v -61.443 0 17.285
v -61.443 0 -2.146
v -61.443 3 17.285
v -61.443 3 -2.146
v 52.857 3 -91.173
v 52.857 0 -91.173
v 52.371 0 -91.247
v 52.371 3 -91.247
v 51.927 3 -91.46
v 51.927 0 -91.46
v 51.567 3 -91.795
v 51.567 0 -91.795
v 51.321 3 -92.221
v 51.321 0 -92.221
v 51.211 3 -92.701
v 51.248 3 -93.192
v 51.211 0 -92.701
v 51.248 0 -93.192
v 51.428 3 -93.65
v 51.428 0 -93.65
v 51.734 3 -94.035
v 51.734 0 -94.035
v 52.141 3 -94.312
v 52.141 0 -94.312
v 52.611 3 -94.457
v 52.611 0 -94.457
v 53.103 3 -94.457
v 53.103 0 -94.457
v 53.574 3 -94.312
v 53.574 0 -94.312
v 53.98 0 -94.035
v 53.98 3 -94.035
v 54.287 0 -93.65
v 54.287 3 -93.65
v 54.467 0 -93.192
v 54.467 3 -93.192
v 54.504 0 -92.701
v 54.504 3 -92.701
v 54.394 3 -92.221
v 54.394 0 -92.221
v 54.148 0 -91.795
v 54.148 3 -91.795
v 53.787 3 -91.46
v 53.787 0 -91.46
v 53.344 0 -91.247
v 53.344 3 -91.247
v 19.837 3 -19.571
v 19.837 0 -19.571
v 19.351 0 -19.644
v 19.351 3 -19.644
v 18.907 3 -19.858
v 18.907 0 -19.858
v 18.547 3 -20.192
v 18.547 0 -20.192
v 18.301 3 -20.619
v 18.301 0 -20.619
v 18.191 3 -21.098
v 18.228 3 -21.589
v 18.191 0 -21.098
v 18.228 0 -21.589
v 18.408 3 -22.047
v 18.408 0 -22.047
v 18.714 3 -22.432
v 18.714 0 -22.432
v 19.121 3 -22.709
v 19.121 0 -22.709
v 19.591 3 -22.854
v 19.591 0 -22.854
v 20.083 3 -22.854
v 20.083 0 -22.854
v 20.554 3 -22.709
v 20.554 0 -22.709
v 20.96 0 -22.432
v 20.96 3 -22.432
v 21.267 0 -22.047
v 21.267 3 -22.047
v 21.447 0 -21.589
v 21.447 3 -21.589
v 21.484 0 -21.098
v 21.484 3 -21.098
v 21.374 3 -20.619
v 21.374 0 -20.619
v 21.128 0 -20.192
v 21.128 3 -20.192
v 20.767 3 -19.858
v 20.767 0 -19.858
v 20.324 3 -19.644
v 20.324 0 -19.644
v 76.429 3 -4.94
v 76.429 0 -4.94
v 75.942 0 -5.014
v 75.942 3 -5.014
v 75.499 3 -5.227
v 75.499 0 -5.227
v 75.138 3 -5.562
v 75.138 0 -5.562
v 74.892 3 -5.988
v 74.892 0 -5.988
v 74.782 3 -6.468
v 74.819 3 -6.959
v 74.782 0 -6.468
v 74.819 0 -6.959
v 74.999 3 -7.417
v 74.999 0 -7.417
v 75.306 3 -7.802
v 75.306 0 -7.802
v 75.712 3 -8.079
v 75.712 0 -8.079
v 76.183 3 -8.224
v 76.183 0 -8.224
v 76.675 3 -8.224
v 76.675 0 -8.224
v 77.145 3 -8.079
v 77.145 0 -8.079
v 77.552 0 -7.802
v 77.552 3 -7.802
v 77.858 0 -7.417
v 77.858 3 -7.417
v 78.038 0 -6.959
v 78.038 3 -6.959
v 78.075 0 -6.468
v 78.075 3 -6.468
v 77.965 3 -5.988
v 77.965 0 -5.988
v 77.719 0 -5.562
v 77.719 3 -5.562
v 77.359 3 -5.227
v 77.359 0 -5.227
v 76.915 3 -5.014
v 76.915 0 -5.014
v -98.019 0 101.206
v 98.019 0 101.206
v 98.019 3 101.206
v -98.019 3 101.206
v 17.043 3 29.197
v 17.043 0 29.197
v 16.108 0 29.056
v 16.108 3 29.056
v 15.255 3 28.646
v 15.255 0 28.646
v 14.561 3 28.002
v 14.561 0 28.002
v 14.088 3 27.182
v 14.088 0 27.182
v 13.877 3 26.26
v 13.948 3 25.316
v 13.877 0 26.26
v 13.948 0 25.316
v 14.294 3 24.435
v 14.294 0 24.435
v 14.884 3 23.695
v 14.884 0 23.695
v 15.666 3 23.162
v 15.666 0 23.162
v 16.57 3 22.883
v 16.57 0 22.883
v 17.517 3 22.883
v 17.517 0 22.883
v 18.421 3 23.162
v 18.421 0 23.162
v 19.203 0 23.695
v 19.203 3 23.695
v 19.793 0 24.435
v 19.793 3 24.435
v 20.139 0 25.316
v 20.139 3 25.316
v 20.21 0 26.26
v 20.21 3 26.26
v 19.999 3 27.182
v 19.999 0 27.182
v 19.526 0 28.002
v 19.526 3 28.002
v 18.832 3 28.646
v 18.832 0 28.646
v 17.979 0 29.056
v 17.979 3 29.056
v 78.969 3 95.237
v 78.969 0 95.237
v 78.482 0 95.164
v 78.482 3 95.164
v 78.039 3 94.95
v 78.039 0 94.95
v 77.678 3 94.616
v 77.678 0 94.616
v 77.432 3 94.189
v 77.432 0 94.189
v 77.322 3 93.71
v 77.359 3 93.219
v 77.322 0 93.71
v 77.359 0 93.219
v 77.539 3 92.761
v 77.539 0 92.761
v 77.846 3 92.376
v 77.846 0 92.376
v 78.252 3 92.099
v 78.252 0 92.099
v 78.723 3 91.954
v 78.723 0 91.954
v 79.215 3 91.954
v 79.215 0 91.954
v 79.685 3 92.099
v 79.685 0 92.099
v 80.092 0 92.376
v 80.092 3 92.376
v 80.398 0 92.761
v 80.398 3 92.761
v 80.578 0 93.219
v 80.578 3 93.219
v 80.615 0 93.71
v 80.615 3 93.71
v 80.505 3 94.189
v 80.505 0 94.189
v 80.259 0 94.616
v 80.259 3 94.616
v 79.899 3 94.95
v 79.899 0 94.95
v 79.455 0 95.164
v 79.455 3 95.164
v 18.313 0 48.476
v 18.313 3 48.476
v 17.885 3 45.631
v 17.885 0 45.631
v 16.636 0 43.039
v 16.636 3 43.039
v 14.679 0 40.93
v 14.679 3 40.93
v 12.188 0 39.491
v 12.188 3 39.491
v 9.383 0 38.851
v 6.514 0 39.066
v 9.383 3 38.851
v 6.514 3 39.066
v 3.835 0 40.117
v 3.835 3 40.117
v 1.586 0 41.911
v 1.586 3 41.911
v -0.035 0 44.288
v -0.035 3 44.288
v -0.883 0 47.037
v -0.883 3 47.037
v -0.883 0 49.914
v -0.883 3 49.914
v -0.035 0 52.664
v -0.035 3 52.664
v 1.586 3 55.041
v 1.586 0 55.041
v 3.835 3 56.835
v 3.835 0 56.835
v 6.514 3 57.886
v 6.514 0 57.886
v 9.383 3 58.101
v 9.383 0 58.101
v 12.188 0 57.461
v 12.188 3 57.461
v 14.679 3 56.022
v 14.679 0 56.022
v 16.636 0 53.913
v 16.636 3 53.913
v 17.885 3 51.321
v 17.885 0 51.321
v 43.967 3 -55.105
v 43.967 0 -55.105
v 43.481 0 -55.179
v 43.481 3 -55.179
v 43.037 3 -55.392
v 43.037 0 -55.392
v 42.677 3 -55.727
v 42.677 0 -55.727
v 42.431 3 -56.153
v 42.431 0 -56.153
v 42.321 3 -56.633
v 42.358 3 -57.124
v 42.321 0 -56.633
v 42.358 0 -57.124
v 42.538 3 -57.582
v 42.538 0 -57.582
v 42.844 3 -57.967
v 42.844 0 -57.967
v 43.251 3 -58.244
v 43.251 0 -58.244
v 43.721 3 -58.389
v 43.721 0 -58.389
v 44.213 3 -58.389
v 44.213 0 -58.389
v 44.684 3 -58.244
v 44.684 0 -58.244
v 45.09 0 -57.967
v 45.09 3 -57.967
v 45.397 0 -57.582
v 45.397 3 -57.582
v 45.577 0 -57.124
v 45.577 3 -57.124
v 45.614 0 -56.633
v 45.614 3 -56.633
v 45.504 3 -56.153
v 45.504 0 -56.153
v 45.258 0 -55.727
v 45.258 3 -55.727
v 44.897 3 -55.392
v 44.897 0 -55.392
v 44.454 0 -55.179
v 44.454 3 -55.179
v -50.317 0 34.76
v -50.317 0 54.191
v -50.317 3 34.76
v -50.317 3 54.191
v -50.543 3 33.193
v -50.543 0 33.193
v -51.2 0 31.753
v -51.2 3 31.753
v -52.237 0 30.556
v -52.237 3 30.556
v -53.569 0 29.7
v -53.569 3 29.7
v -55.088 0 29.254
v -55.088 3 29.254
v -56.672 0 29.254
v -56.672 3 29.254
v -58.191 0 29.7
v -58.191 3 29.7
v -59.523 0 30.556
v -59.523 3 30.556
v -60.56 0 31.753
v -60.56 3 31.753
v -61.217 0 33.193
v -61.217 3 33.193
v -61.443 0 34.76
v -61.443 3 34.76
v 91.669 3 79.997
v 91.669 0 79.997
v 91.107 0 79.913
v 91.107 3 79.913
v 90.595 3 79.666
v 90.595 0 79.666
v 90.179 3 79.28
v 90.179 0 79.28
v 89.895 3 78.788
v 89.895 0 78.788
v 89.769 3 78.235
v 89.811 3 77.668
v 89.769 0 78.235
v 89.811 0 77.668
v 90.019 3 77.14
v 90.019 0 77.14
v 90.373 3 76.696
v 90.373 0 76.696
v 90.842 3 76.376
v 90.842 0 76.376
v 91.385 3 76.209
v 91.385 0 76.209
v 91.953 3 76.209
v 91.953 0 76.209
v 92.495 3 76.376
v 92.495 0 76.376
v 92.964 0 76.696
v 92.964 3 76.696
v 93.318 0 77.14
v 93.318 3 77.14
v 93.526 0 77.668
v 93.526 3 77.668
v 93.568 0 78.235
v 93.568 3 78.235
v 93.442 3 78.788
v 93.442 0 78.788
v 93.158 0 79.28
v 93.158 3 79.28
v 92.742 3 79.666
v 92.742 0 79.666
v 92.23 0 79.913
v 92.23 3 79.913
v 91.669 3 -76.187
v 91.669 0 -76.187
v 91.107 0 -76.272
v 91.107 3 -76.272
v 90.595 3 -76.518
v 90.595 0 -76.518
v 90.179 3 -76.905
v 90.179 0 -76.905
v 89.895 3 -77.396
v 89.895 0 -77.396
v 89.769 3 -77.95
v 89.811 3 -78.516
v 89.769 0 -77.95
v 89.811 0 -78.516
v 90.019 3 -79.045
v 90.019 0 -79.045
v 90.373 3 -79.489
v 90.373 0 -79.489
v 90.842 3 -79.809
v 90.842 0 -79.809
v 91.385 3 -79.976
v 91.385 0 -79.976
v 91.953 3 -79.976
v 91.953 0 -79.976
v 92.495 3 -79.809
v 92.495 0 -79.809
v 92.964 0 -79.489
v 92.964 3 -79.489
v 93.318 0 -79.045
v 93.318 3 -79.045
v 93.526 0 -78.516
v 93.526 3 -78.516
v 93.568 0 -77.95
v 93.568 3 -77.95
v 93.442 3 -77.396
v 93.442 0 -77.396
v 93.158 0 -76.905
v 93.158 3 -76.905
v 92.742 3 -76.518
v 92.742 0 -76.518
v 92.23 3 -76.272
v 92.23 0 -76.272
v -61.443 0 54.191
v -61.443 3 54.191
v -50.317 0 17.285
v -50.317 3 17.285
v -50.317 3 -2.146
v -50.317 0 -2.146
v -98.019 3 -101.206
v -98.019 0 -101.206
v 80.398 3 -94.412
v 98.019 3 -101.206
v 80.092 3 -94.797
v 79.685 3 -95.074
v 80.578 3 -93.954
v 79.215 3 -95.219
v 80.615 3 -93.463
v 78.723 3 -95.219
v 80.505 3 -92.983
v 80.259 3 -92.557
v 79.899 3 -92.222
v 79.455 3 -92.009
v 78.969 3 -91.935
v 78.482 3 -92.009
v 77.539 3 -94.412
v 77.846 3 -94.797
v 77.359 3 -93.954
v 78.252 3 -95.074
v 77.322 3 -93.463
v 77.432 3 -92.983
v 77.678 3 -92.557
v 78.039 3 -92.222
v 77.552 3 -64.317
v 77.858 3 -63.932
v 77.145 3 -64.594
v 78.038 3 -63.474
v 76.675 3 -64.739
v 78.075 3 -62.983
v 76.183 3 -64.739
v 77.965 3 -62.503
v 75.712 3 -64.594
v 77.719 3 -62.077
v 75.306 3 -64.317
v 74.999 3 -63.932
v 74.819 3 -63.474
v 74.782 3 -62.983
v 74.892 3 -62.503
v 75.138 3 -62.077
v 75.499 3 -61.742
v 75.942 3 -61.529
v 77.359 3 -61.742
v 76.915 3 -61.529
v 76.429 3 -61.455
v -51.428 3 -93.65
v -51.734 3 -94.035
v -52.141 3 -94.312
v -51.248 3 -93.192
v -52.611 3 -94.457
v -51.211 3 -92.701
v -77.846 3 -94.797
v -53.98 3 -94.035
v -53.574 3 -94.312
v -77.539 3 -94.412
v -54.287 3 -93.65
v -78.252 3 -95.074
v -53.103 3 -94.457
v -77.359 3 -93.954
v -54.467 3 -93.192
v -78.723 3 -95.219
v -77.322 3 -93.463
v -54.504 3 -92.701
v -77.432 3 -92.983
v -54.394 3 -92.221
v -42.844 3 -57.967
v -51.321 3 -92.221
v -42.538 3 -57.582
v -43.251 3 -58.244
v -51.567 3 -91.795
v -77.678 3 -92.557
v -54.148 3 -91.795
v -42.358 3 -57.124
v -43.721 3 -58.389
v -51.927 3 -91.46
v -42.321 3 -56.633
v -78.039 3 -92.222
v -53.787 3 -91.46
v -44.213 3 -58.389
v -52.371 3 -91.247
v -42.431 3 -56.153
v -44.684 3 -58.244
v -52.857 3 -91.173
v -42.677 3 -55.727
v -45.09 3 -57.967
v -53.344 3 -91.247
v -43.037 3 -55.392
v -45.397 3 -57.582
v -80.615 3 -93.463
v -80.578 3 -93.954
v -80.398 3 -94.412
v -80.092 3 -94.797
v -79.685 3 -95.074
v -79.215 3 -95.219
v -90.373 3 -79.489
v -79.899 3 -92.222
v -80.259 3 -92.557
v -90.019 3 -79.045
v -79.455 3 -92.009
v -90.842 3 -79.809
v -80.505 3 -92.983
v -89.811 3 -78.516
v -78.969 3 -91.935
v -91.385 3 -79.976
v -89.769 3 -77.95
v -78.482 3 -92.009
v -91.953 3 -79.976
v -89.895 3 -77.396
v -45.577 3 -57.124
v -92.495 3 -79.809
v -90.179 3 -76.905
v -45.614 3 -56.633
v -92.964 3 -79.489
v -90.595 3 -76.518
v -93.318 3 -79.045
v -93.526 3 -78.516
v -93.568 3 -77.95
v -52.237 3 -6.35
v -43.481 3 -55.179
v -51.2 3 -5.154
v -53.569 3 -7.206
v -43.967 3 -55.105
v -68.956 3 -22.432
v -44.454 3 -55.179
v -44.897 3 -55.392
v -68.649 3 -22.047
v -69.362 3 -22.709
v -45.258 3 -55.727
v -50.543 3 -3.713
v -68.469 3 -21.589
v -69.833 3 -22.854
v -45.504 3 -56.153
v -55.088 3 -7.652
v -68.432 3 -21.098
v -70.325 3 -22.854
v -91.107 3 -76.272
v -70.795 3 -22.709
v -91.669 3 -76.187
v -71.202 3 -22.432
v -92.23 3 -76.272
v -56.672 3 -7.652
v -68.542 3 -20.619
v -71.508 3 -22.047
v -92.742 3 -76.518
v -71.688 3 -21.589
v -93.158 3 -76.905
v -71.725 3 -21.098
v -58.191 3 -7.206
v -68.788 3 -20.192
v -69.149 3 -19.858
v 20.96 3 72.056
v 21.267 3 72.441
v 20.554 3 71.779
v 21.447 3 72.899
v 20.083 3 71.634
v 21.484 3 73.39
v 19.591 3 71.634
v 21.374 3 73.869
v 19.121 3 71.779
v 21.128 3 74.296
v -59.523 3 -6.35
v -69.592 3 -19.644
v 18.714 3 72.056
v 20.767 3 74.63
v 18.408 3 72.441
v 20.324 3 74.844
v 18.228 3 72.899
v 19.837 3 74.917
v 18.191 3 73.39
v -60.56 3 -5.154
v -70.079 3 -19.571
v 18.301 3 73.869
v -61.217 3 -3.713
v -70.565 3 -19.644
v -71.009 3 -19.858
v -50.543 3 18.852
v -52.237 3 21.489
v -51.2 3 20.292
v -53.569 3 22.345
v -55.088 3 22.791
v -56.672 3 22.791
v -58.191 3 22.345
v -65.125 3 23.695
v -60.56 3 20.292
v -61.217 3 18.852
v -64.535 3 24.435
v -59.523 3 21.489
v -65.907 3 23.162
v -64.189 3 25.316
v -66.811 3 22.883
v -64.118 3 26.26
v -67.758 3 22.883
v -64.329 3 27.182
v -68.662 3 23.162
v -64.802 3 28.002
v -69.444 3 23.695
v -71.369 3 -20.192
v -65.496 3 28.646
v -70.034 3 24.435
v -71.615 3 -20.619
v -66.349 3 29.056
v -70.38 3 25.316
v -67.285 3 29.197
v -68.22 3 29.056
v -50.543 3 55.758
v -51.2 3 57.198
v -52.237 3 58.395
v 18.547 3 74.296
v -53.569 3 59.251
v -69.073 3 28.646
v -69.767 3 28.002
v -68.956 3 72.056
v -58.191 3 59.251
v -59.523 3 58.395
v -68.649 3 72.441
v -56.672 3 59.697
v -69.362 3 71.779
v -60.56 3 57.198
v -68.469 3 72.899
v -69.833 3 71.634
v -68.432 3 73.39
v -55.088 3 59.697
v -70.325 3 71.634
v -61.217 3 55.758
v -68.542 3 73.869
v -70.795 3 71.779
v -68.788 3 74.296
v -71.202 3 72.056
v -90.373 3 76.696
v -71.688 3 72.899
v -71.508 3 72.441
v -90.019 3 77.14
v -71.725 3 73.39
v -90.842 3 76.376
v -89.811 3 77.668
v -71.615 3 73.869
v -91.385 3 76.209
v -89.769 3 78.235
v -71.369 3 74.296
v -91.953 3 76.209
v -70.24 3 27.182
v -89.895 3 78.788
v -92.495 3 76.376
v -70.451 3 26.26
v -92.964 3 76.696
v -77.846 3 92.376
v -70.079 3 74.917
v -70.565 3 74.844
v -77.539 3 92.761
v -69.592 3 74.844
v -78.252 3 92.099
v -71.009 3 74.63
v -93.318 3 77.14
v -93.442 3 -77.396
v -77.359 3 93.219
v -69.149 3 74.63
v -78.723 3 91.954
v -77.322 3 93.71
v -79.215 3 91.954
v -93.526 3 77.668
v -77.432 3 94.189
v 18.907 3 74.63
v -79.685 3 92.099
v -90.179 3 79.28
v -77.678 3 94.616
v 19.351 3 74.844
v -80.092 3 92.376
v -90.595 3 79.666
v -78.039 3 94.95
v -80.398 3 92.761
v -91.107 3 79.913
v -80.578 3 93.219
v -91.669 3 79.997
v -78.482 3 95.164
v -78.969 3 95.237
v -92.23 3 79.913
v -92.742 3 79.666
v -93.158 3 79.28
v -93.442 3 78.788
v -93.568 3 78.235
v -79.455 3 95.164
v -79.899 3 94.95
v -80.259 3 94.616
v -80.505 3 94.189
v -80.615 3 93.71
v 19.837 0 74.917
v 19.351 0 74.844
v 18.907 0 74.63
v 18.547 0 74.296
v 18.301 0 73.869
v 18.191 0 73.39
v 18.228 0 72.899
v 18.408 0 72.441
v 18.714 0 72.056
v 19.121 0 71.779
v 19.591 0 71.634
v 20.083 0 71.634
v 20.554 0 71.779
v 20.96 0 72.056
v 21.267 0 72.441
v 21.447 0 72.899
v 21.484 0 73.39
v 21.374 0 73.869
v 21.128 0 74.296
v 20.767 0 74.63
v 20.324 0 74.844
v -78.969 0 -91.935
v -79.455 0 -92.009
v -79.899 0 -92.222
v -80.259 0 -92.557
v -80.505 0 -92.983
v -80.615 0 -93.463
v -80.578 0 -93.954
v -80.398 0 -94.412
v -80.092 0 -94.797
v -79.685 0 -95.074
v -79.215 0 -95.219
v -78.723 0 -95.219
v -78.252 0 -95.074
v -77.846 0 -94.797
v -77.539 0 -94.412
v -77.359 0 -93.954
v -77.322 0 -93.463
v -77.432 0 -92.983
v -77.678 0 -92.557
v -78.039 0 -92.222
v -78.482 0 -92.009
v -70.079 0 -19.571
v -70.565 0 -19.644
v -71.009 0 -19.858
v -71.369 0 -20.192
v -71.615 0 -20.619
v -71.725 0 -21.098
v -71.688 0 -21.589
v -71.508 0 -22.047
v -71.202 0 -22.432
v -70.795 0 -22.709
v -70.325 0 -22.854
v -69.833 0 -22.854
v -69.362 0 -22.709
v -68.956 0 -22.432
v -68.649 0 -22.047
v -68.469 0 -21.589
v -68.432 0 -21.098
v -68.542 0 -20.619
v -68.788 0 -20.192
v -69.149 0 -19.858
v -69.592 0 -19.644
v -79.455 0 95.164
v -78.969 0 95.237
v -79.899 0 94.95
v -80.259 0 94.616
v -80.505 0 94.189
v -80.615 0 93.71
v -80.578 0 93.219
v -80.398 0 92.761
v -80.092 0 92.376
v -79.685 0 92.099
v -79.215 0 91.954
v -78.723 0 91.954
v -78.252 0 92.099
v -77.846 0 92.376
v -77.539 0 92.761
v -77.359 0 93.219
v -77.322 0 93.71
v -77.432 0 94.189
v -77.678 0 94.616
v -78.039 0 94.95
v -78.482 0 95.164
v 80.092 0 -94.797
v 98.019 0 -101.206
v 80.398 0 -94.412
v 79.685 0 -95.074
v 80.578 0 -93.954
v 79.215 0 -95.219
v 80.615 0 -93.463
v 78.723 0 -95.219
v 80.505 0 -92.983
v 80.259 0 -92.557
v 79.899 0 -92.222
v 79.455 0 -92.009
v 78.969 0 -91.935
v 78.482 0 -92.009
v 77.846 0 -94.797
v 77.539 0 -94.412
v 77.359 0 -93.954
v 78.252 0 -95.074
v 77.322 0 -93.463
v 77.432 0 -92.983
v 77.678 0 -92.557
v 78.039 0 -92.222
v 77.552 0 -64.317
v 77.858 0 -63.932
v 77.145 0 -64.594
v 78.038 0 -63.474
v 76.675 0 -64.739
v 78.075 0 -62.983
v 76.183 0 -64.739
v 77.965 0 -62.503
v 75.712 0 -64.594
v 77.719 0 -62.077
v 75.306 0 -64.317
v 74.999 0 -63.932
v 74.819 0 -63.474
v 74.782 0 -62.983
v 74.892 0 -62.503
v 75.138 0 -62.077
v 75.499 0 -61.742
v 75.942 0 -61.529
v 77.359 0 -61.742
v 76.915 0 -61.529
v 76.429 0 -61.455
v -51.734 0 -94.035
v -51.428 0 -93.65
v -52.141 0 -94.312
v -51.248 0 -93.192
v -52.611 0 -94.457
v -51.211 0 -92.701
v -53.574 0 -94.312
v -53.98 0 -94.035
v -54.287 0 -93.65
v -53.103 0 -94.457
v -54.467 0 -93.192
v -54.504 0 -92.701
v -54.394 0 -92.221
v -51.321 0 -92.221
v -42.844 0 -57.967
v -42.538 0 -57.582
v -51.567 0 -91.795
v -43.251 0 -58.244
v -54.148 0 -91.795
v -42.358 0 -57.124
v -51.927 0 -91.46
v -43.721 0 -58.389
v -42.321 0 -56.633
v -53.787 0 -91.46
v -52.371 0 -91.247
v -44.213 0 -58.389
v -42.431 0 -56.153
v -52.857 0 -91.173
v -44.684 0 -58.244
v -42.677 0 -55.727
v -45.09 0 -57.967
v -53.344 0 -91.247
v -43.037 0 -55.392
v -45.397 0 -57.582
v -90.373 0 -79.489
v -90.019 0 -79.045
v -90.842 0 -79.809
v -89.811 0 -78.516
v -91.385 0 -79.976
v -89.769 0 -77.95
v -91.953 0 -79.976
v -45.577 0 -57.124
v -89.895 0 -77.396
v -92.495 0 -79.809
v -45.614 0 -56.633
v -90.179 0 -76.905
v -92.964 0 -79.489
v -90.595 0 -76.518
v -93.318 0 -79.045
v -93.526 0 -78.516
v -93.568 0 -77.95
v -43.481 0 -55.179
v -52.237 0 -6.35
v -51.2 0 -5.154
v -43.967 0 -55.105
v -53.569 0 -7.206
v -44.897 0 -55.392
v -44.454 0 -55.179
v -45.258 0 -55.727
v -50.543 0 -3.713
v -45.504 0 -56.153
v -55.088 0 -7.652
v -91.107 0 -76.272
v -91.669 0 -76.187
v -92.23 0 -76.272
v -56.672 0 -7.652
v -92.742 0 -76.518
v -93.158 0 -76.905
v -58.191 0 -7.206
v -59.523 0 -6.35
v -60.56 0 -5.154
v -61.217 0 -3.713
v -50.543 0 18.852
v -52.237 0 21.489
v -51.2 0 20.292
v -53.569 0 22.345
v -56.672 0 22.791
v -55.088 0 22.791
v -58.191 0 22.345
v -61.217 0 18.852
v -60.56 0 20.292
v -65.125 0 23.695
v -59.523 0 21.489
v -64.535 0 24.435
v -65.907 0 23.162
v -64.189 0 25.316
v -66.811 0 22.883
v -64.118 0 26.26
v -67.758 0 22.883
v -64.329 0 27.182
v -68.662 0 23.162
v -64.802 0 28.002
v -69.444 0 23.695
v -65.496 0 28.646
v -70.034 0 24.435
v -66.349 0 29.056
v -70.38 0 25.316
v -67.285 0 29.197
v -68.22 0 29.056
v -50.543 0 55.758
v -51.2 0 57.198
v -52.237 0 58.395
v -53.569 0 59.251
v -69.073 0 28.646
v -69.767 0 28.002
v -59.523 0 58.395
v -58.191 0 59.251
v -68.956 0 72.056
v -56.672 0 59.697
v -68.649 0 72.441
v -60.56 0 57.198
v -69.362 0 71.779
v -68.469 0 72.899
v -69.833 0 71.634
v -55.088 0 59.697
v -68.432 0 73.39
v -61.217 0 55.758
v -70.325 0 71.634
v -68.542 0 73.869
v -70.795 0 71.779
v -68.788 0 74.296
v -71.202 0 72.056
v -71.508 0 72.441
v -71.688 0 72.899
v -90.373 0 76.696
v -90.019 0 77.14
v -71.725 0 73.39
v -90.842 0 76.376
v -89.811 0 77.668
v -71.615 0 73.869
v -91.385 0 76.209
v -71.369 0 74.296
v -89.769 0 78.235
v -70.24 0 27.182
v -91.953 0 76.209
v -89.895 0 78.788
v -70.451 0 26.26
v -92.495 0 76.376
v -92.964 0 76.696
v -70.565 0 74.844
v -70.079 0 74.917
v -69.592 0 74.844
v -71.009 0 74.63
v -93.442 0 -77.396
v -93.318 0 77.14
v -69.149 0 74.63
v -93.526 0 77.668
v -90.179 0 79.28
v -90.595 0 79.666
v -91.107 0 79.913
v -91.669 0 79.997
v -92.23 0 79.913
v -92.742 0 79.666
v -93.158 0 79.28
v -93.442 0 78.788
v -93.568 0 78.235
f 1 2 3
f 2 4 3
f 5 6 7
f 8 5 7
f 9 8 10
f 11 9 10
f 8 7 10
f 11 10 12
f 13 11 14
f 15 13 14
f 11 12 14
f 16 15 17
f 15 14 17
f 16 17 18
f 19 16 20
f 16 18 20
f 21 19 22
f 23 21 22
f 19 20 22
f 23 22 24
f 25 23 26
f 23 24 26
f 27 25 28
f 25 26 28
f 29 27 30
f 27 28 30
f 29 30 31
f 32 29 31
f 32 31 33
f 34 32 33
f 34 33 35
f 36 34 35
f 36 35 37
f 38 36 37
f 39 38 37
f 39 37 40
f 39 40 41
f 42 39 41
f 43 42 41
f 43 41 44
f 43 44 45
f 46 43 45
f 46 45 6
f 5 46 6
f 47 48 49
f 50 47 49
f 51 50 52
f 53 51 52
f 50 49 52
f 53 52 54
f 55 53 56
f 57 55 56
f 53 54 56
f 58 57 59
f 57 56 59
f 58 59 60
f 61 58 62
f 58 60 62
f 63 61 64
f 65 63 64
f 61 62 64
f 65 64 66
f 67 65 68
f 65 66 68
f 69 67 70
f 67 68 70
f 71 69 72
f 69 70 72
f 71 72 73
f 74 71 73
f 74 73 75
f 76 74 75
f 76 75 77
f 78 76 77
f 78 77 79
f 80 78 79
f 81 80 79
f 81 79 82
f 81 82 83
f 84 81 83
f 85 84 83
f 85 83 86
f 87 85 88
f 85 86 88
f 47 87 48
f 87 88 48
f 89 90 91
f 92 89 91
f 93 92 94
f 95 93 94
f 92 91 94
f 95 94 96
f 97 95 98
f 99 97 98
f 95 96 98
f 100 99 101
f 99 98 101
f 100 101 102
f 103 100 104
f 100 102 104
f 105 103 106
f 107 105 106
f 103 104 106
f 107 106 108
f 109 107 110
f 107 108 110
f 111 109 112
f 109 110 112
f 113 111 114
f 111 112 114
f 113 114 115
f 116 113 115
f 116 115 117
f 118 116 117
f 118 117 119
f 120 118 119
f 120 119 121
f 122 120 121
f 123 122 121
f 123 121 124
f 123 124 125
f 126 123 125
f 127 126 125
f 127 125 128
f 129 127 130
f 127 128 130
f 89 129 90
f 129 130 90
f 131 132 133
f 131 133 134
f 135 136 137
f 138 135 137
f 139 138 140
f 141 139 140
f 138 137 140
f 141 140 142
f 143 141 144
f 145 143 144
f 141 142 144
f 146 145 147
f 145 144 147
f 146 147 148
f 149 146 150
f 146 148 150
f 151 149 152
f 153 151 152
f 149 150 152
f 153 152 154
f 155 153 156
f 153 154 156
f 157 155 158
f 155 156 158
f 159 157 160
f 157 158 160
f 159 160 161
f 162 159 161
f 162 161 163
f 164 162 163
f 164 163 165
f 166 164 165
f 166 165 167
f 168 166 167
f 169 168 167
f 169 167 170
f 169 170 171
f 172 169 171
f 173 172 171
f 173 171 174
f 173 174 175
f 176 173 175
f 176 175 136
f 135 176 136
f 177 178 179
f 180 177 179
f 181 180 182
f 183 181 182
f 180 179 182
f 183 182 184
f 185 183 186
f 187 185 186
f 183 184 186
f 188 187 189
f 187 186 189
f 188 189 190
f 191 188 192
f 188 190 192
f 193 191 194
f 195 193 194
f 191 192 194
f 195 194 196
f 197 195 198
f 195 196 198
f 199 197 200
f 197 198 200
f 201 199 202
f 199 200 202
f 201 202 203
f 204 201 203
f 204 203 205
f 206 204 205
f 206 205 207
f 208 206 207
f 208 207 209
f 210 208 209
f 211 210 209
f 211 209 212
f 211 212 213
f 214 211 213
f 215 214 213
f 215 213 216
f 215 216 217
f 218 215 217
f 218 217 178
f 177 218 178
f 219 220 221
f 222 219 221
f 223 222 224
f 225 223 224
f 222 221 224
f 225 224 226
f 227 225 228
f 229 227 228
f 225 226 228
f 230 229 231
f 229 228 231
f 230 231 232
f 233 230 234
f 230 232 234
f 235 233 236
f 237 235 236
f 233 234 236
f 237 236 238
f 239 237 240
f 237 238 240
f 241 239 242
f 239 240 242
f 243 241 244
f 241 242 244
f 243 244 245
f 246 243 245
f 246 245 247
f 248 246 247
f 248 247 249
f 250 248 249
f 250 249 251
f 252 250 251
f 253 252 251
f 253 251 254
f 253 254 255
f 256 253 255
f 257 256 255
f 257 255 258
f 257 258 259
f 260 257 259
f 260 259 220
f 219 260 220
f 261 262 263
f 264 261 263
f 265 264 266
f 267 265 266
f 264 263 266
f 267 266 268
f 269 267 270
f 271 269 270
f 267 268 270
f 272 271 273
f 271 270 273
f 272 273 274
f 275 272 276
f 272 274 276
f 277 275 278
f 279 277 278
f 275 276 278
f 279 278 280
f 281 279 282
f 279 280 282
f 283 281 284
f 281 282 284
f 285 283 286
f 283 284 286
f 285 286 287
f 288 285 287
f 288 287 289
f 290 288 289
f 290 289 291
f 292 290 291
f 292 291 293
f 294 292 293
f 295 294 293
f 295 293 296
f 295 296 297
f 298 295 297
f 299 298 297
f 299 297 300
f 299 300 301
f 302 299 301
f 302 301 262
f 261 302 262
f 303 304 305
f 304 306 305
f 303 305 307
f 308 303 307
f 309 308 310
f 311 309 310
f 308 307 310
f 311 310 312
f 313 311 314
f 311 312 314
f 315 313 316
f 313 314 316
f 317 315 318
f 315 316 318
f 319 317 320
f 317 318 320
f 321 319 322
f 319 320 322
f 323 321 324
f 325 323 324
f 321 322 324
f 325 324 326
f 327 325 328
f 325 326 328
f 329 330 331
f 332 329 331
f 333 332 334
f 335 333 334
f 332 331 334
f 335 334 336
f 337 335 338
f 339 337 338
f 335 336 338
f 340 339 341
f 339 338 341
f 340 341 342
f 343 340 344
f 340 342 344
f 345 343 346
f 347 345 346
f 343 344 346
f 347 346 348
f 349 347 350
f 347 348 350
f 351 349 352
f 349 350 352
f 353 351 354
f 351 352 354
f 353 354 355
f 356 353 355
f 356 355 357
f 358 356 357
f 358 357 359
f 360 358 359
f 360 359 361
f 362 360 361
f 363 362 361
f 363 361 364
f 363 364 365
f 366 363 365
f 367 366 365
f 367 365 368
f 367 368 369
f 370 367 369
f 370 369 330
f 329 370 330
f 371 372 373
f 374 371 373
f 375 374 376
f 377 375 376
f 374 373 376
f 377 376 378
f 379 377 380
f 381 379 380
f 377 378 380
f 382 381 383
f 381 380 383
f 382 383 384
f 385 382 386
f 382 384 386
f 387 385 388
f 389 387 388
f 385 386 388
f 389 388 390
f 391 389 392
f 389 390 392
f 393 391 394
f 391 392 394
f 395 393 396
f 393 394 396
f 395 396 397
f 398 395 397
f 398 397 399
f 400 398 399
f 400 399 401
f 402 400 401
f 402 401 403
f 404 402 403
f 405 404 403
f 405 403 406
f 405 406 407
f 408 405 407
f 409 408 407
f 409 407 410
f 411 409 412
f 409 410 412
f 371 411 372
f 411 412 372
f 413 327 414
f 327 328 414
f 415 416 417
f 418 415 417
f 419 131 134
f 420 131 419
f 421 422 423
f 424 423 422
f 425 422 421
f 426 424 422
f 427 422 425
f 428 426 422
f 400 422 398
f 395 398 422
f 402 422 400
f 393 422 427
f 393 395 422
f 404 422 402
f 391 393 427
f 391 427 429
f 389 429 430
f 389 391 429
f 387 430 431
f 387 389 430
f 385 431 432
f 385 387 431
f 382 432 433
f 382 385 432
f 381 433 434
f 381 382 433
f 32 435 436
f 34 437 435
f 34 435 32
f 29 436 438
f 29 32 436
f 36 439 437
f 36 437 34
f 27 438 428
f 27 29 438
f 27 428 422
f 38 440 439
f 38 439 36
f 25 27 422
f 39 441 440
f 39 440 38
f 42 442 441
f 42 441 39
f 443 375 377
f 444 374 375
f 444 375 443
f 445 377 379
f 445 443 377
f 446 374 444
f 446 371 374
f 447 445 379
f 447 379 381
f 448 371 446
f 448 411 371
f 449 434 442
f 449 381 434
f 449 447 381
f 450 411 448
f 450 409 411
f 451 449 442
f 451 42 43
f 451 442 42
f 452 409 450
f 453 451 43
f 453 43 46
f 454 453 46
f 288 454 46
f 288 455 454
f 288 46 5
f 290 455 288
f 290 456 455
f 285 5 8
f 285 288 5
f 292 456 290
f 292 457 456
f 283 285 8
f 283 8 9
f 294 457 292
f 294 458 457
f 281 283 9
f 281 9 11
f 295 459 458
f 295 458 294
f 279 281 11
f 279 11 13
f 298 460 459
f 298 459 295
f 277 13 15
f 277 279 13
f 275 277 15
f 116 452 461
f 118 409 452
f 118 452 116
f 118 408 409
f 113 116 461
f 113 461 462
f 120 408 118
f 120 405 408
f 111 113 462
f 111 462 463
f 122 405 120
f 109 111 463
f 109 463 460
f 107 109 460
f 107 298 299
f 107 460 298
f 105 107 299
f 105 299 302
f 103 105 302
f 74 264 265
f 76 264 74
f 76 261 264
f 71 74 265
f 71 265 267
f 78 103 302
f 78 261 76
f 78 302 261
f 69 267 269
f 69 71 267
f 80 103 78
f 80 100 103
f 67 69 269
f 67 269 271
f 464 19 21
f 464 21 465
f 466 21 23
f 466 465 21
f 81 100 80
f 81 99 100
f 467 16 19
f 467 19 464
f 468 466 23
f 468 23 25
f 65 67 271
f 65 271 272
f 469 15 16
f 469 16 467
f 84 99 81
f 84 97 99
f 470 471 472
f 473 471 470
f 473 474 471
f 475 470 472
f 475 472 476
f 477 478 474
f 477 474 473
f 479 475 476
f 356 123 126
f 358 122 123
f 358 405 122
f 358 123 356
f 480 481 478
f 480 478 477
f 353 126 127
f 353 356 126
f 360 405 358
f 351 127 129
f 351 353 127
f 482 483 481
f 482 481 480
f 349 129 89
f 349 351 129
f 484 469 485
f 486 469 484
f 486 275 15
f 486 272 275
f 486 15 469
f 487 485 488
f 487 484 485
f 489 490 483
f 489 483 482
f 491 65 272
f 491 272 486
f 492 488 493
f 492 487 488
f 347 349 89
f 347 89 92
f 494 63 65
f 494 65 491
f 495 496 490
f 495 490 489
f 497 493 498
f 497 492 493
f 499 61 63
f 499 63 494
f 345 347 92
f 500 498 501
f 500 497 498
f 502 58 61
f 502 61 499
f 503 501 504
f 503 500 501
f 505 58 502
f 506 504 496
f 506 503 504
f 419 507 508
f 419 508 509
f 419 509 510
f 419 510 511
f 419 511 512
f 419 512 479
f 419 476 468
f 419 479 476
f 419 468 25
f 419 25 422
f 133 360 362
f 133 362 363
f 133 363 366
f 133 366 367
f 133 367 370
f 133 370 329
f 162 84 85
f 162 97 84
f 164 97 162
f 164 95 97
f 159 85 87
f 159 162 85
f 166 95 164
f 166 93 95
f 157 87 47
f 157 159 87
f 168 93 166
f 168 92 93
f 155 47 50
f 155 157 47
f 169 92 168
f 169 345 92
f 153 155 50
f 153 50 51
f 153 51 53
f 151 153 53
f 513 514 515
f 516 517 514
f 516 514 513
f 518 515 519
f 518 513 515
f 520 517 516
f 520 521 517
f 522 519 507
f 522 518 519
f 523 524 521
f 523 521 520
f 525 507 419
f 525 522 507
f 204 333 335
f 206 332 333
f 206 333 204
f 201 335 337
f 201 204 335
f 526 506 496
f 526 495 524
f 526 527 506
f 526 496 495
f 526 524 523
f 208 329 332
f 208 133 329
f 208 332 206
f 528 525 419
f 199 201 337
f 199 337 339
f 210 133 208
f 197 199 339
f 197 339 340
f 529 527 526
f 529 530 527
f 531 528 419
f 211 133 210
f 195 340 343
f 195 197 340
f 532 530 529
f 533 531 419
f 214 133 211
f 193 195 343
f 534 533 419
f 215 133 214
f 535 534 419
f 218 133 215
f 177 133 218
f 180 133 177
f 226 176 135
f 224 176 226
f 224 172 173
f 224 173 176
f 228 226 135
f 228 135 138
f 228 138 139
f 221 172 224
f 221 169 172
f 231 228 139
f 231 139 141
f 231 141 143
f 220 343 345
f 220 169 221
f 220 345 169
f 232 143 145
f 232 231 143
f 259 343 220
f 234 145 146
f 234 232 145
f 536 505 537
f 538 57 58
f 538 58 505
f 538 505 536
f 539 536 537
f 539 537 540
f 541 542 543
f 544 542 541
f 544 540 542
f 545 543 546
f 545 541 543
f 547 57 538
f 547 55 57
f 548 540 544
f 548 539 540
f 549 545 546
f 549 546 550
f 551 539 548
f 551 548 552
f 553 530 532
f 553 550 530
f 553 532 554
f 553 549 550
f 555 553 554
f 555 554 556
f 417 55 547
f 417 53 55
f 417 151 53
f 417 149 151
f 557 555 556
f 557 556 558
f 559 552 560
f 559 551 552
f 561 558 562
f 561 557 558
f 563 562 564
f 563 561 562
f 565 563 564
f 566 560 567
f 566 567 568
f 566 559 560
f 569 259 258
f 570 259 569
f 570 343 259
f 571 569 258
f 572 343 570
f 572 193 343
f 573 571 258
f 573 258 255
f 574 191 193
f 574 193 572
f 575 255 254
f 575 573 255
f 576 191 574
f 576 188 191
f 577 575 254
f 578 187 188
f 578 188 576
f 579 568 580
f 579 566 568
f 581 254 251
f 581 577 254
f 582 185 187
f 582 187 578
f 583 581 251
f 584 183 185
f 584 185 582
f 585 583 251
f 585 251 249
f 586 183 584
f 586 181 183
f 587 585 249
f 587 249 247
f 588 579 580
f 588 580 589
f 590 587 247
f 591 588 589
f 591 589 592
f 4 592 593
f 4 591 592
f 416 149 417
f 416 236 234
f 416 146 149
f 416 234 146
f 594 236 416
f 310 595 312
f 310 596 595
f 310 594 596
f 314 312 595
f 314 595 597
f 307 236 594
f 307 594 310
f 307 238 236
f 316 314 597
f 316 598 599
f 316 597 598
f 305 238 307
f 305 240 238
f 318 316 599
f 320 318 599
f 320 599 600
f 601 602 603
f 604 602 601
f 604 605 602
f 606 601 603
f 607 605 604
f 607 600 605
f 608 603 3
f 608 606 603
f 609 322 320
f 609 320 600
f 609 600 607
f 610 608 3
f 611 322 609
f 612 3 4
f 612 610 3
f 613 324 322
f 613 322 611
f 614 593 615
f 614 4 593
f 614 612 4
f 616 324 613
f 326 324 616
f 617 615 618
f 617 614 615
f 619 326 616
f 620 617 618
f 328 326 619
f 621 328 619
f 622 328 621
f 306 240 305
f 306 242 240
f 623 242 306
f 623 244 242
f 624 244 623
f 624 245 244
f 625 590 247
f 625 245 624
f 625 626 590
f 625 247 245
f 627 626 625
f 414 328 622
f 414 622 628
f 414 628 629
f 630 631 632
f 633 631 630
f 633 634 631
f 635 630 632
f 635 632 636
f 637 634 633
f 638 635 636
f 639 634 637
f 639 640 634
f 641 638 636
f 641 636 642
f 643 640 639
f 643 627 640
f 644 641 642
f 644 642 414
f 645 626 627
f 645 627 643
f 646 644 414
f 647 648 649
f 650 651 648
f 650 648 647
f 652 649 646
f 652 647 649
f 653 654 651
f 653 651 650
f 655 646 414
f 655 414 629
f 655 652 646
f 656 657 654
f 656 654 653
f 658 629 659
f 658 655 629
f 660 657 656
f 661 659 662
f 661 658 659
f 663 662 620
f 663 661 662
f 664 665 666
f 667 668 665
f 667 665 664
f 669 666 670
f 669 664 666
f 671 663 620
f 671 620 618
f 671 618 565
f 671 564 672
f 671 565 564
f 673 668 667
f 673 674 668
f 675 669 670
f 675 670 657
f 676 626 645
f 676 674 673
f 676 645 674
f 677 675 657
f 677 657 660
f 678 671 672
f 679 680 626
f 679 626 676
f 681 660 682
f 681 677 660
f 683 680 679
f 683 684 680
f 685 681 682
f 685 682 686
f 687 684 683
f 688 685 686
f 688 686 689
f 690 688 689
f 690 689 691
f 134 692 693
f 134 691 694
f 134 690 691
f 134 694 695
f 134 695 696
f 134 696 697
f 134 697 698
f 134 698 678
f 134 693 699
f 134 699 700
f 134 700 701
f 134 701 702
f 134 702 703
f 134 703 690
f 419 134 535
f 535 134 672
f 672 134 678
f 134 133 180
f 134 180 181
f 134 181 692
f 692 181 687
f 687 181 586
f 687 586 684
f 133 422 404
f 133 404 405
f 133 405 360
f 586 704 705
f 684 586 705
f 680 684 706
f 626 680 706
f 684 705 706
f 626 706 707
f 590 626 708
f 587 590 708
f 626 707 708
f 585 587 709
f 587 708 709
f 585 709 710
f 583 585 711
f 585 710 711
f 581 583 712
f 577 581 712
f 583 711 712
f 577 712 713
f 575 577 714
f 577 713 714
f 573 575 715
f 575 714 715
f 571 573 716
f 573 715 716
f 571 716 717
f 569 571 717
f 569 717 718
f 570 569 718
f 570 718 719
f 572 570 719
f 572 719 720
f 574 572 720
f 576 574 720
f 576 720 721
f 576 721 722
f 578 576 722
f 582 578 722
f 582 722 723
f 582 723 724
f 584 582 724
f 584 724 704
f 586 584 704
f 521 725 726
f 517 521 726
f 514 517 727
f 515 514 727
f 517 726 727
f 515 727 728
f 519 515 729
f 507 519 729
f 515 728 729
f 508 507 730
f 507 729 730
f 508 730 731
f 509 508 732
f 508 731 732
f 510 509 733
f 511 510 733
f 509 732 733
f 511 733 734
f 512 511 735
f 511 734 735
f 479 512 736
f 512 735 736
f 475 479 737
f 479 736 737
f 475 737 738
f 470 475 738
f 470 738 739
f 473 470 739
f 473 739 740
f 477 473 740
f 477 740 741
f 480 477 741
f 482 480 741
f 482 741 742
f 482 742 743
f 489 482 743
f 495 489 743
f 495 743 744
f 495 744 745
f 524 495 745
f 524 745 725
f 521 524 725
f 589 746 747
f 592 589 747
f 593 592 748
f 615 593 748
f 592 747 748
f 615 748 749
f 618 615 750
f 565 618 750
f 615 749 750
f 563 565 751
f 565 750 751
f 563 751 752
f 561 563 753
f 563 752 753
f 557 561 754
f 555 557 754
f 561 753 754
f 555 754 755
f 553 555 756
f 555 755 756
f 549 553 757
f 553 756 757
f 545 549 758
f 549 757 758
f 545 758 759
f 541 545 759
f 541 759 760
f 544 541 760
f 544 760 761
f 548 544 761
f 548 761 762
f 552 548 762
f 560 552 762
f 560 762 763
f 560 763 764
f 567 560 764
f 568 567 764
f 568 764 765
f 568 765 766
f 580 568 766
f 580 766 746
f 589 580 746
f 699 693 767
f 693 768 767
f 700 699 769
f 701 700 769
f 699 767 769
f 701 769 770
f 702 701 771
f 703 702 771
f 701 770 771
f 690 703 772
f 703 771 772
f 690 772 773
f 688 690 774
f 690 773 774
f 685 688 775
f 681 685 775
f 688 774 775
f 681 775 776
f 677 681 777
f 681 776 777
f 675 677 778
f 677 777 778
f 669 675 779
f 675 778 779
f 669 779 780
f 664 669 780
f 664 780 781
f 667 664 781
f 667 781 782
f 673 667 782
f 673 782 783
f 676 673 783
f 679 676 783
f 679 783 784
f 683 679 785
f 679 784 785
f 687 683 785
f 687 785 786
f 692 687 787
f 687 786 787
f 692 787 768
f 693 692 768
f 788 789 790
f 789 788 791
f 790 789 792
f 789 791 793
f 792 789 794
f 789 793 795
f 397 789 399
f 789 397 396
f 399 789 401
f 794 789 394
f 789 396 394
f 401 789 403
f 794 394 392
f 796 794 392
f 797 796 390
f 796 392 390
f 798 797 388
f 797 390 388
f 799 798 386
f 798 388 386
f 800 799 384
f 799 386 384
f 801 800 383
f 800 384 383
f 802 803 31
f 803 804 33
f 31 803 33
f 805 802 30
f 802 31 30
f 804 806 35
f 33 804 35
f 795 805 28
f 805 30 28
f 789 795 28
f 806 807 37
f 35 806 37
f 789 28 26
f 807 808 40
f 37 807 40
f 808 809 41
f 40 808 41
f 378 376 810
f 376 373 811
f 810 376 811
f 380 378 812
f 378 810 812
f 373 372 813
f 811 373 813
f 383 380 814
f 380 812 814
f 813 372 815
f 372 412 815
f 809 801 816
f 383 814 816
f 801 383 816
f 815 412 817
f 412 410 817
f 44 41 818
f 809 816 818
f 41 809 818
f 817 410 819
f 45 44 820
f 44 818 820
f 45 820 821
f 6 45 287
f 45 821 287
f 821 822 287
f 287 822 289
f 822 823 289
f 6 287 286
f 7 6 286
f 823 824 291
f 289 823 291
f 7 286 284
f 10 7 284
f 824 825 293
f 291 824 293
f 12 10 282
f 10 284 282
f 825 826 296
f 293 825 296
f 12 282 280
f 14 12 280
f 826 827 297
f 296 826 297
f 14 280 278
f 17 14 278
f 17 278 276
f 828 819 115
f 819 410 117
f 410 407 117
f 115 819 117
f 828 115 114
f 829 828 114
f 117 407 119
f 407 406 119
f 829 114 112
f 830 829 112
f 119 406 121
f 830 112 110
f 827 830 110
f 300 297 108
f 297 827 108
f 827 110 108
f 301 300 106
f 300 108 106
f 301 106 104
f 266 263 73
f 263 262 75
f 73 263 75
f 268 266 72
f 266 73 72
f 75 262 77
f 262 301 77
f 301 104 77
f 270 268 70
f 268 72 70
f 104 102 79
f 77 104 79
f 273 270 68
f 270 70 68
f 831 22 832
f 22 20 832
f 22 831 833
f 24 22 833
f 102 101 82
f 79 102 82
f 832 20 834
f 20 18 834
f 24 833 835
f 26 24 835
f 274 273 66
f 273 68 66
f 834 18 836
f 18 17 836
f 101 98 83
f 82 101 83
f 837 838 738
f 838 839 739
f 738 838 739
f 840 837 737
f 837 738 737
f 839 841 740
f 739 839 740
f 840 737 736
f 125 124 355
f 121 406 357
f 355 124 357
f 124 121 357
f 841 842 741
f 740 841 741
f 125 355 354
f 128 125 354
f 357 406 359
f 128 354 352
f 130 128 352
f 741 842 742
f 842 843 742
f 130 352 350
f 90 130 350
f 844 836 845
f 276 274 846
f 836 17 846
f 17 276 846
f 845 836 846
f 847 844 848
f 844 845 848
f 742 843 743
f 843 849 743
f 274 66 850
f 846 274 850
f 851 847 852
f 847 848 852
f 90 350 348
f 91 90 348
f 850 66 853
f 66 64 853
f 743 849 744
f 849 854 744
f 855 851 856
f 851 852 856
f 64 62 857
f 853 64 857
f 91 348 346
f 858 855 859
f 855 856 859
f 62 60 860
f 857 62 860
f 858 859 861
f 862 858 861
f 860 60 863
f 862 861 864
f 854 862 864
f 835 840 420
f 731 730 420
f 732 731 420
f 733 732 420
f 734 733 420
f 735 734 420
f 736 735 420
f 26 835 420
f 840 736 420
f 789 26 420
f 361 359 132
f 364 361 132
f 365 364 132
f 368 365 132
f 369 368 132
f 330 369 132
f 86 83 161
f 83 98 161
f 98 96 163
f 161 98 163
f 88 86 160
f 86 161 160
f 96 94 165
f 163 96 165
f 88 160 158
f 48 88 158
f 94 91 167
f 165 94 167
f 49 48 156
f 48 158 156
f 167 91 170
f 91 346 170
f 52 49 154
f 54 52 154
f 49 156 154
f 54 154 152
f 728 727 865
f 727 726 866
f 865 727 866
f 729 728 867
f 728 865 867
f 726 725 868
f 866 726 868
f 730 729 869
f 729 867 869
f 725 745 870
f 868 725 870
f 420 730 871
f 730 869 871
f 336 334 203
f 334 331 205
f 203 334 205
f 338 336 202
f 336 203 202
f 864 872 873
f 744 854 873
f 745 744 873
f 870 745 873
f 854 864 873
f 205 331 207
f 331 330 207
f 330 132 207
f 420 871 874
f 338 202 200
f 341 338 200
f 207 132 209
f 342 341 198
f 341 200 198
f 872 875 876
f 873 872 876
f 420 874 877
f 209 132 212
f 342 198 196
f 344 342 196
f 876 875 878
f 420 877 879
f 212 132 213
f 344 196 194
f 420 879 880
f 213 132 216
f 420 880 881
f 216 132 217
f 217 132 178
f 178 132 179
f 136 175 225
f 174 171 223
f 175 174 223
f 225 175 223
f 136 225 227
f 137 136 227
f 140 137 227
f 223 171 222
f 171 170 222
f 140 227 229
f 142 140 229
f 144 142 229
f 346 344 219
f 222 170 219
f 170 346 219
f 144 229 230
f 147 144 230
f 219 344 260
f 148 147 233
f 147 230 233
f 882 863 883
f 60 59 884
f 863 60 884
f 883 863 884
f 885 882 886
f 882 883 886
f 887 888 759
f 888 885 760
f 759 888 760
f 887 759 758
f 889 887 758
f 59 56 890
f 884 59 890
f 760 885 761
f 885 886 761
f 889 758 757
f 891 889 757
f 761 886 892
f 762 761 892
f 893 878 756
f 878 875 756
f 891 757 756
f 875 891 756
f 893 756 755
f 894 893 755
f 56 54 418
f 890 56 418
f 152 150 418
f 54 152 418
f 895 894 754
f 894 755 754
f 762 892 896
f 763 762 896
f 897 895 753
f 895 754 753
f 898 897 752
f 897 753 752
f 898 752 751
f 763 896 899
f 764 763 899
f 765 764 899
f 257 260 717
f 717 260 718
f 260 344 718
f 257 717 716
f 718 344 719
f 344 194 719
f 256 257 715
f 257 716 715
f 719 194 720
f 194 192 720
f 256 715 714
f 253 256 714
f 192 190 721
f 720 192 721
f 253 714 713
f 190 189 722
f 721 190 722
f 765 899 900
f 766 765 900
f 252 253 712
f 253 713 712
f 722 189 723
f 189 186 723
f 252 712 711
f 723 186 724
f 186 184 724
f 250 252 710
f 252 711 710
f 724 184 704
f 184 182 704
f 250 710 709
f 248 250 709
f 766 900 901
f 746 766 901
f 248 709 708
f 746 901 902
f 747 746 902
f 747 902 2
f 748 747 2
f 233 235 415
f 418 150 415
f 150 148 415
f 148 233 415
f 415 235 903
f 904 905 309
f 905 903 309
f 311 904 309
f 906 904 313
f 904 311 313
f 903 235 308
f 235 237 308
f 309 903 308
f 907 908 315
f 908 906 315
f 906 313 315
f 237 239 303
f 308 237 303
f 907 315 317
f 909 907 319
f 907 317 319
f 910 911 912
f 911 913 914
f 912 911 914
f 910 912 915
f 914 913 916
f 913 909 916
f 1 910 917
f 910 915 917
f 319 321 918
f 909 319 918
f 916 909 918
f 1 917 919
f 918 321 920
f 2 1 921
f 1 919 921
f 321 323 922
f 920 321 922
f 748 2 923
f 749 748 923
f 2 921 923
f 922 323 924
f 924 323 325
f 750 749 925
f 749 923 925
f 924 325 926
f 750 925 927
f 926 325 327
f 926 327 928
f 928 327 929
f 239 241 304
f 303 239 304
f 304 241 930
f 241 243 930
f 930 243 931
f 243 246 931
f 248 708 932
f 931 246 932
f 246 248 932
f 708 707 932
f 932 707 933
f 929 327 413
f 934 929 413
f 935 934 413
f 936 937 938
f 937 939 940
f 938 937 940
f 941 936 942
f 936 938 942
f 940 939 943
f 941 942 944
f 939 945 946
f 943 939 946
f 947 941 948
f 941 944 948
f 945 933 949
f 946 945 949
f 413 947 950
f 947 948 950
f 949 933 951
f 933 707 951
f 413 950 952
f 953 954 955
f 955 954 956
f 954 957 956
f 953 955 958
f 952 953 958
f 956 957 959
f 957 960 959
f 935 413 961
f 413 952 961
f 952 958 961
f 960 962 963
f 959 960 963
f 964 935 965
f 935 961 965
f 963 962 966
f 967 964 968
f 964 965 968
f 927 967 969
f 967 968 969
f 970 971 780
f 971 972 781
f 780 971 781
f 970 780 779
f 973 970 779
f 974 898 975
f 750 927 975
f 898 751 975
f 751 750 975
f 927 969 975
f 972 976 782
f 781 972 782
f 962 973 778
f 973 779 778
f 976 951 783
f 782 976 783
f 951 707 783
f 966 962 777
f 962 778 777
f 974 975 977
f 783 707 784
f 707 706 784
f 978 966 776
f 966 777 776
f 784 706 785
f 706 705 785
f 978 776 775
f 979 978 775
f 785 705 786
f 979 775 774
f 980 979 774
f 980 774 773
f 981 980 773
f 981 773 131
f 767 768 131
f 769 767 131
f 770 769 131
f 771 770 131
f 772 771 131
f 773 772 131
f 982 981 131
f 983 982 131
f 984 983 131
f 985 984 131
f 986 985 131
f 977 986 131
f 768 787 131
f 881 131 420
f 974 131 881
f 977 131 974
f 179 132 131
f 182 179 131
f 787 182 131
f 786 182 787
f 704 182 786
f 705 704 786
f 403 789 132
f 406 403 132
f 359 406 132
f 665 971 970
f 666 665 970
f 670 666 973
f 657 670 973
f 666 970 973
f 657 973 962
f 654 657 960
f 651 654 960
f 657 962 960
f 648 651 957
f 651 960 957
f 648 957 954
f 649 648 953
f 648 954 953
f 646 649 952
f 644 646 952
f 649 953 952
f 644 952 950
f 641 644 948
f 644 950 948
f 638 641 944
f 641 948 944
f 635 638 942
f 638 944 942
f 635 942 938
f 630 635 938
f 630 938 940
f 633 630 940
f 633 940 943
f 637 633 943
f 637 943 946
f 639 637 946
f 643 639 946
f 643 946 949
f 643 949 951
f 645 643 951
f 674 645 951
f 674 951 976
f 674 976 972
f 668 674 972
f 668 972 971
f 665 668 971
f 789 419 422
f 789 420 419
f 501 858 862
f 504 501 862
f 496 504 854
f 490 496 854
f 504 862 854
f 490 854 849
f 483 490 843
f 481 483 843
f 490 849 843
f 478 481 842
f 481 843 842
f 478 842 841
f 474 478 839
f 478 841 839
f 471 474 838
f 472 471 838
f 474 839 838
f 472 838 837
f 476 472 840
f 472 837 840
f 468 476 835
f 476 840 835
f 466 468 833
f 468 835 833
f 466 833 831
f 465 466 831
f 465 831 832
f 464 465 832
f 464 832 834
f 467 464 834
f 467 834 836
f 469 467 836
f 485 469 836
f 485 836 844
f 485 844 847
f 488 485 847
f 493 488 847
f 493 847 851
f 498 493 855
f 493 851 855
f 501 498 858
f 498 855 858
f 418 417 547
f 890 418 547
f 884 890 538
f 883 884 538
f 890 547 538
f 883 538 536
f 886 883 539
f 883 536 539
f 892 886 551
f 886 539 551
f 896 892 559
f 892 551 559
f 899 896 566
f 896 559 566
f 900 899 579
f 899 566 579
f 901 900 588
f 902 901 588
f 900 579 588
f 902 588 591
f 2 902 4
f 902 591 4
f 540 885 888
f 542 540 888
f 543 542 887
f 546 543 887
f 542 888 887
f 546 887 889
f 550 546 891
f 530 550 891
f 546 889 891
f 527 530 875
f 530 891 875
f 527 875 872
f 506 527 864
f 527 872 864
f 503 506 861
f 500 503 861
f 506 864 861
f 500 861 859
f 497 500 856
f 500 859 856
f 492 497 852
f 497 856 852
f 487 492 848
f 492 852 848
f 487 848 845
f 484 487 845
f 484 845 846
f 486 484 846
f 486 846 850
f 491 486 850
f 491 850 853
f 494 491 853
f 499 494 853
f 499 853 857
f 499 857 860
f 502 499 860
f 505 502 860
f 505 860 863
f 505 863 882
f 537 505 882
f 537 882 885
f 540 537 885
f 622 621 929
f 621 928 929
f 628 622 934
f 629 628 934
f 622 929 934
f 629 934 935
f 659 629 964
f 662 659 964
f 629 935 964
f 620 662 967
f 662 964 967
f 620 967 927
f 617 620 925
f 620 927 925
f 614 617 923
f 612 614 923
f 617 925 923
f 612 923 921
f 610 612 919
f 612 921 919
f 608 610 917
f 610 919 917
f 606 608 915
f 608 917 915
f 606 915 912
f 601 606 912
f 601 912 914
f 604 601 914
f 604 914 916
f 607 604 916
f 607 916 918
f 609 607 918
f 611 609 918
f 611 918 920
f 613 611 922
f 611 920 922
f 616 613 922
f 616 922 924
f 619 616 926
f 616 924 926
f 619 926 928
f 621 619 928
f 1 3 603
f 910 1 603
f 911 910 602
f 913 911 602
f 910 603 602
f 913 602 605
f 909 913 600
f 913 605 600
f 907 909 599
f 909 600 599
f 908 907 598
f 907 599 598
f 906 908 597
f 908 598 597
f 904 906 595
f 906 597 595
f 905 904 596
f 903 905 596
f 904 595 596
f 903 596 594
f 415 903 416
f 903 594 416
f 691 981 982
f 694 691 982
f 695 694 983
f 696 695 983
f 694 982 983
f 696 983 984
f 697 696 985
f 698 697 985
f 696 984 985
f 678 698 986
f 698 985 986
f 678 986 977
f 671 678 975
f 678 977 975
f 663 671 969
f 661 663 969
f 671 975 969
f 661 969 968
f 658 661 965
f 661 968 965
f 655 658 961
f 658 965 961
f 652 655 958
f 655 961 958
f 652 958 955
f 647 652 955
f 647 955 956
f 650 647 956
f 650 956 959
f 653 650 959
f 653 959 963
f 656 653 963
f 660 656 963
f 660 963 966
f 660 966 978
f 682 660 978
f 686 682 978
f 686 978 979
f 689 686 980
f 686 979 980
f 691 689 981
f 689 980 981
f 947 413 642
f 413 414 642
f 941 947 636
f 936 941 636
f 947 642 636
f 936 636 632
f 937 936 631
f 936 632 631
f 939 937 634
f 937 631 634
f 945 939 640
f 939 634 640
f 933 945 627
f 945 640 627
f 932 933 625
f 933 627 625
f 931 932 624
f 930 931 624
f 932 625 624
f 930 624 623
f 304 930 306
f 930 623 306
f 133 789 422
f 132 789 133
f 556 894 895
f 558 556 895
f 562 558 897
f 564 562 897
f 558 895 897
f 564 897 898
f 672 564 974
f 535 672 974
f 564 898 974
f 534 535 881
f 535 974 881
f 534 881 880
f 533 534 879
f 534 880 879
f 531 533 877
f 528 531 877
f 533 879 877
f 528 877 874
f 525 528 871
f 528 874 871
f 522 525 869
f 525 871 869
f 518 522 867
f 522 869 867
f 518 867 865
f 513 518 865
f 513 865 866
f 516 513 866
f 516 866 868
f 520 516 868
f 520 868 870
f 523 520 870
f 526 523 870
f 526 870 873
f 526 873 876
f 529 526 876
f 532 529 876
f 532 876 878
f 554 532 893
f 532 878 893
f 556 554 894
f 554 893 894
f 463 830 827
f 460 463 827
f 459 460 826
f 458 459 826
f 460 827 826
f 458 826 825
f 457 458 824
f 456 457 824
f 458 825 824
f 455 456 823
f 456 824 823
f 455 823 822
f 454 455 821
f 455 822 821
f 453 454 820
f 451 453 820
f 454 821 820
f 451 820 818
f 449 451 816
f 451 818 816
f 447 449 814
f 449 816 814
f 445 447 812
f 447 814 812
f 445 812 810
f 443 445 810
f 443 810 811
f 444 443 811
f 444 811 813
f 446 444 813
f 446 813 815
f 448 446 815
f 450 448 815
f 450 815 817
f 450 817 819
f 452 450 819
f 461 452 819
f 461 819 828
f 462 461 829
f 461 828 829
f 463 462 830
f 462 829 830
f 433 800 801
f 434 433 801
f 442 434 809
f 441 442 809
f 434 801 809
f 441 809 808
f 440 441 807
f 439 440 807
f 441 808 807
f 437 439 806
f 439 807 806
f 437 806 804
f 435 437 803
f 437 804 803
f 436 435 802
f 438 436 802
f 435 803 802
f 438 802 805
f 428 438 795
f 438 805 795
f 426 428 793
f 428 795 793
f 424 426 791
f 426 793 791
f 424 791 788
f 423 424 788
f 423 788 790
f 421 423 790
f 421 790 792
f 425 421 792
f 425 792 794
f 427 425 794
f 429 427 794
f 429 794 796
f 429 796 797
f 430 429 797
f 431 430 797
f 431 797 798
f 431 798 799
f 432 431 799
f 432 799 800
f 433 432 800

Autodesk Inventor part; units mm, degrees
ref_plane "YZ Plane" through (0, 0, 0) normal (1, 0, 0) x (0, 1, 0)
ref_plane "XZ Plane" through (0, 0, 0) normal (0, 1, 0) x (-1, 0, 0)
ref_plane "XY Plane" through (0, 0, 0) normal (0, 0, 1) x (1, 0, 0)
sketch "Sketch1" plane through (0, 0, 0) normal (0, 1, 0) x (-1, 0, 0)
  line L0 (98.0186, -101.2063) -> (-98.0186, -101.2063)
  line L1 (-98.0186, -101.2063) -> (-98.0186, 101.2063)
  line L2 (-98.0186, 101.2063) -> (98.0186, 101.2063)
  line L3 (98.0186, 101.2063) -> (98.0186, -101.2063)
  line L4 (98.0186, -101.2063) -> (-98.0186, 101.2063) construction
  line L5 (-98.0186, -101.2063) -> (98.0186, 101.2063) construction
  point P0 (0, 0)
  dimension "d0" = 196.0372
  dimension "d1" = 202.4126
extrude "Extrusion1" add sketch "Sketch1" along normal blind 3
sketch "Sketch2" plane through (0, 3, 0) normal (0, 1, 0) x (1, 0, 0)
  line L0 (98.0186, 101.2063) -> (-98.0186, 101.2063) projected
  line L1 (-98.0186, 101.2063) -> (-98.0186, -101.2063) projected
  line L2 (-98.0186, -101.2063) -> (98.0186, -101.2063) projected
  line L3 (98.0186, -101.2063) -> (98.0186, 101.2063) projected
  point P0 (0, 0)
  point P1 (-91.6686, 78.0923)
  point P2 (91.6686, 78.0923)
  point P3 (-91.6686, -78.0923)
  point P4 (91.6686, -78.0923)
  dimension "d4" = 23.114
  dimension "d5" = 23.114
  dimension "d6" = 6.35
  dimension "d7" = 6.35
hole "Hole1" at (-91.6686, 3, -78.0923) at (91.6686, 3, -78.0923) at (-91.6686, 3, 78.0923) at (91.6686, 3, 78.0923) direction (0, -1, 0) diameter 3.81 end through all
sketch "Sketch5" plane through (0, 3, 0) normal (0, 1, 0) x (1, 0, 0)
  line L0 (-98.0186, 101.2063) -> (-98.0186, -101.2063) projected
  line L1 (-98.0186, -101.2063) -> (98.0186, -101.2063) projected
  point P0 (0, 0)
  point P1 (-70.0786, -73.2663)
  point P2 (19.8374, -73.2663)
  point P3 (19.8374, 21.2217)
  point P4 (-70.0786, 21.2217)
  dimension "d44" = 27.94
  dimension "d45" = 27.94
  dimension "d46" = 89.916
  dimension "d47" = 94.488
hole "Hole4" at (-70.0786, 3, 73.2663) at (19.8374, 3, 73.2663) at (19.8374, 3, -21.2217) at (-70.0786, 3, -21.2217) direction (0, -1, 0) diameter 3.302 end through all
sketch "Sketch6" plane through (0, 3, 0) normal (0, 1, 0) x (1, 0, 0)
  circle A0 centre (-70.0786, -73.2663) radius 1.651 projected
  circle A1 centre (19.8374, -73.2663) radius 1.651 projected
  point P0 (0, 0)
  point P1 (-67.2846, -26.0223)
  point P2 (17.0434, -26.0223)
  dimension "d55" = 2.794
  dimension "d56" = 2.794
  dimension "d57" = 47.244
hole "Hole5" at (-67.2846, 3, 26.0223) at (17.0434, 3, 26.0223) direction (0, -1, 0) diameter 6.35 end through all
sketch "Sketch10" plane through (0, 3, 0) normal (0, 1, 0) x (1, 0, 0)
  line L0 (98.0186, 101.2063) -> (-98.0186, 101.2063) projected
  line L1 (98.0186, -101.2063) -> (98.0186, 101.2063) projected
  line L2 (0, 56.7563) -> (0, 92.8243)
  point P0 (0, 0)
  point P1 (-52.8574, 92.8243)
  point P2 (-43.9674, 56.7563)
  point P3 (52.8574, 92.8243)
  point P4 (43.9674, 56.7563)
  dimension "d91" = 52.8574
  dimension "d92" = 8.382
  dimension "d93" = 36.068
  dimension "d94" = 8.89
hole "Hole8" at (-52.8574, 3, -92.8243) at (-43.9674, 3, -56.7563) at (52.8574, 3, -92.8243) at (43.9674, 3, -56.7563) direction (0, -1, 0) diameter 3.302 end through all
sketch "Sketch11" plane through (0, 3, 0) normal (0, 1, 0) x (1, 0, 0)
  line L0 (98.0186, 101.2063) -> (-98.0186, 101.2063) projected
  line L1 (98.0186, -101.2063) -> (98.0186, 101.2063) projected
  point P0 (0, 0)
  point P1 (76.4286, 6.5913)
  point P2 (76.4286, 63.1063)
  dimension "d103" = 56.515
  dimension "d111" = 38.1
  dimension "d123" = 21.59
hole "Hole9" at (76.4286, 3, -6.5913) at (76.4286, 3, -63.1063) direction (0, -1, 0) diameter 3.302 end through all
sketch "Sketch12" plane through (0, 3, 0) normal (0, 1, 0) x (1, 0, 0)
  line L0 (98.0186, 101.2063) -> (-98.0186, 101.2063) projected
  line L1 (-98.0186, 101.2063) -> (-98.0186, -101.2063) projected
  line L2 (-98.0186, -101.2063) -> (98.0186, -101.2063) projected
  line L3 (98.0186, -101.2063) -> (98.0186, 101.2063) projected
  point P0 (0, 0)
  point P1 (-78.9686, -93.5863)
  point P2 (78.9686, -93.5863)
  point P3 (78.9686, 93.5863)
  point P4 (-78.9686, 93.5863)
  dimension "d112" = 7.62
  dimension "d113" = 19.05
  dimension "d114" = 7.62
  dimension "d115" = 19.05
hole "Hole10" at (-78.9686, 3, 93.5863) at (78.9686, 3, 93.5863) at (78.9686, 3, -93.5863) at (-78.9686, 3, -93.5863) direction (0, -1, 0) diameter 3.302 end through all
sketch "Sketch13" plane through (0, 3, 0) normal (0, 1, 0) x (1, 0, 0)
  line L0 (-55.88, 2.1463) -> (-55.88, -17.2847) construction
  line L1 (-61.4426, 2.1463) -> (-61.4426, -17.2847)
  line L2 (-50.3174, -17.2847) -> (-50.3174, 2.1463)
  arc A0 (-50.3174, 2.1463) -> (-61.4426, 2.1463) centre (-55.88, 2.1463) ccw
  arc A1 (-61.4426, -17.2847) -> (-50.3174, -17.2847) centre (-55.88, -17.2847) ccw
  circle A2 centre (-70.0786, 21.2217) radius 1.651 projected
  line L3 (-55.88, -34.7599) -> (-55.88, -54.1909) construction
  line L4 (-61.4426, -34.7599) -> (-61.4426, -54.1909)
  line L5 (-50.3174, -54.1909) -> (-50.3174, -34.7599)
  arc A3 (-50.3174, -34.7599) -> (-61.4426, -34.7599) centre (-55.88, -34.7599) ccw
  arc A4 (-61.4426, -54.1909) -> (-50.3174, -54.1909) centre (-55.88, -54.1909) ccw
  point P0 (0, 0)
  point P1 (-55.88, -7.5692)
  point P2 (-55.88, -44.4754)
  dimension "d124" = 14.1986
  dimension "d125" = 11.1252
  dimension "d126" = 19.0754
  dimension "d127" = 19.431
  dimension "d128" = 19.431
  dimension "d129" = 11.1252
  dimension "d138" = 17.4752
extrude "Extrusion3" cut sketch "Sketch13" against normal through all contours A0 L2 A1 L1 | A3 L5 A4 L4
sketch "Sketch14" plane through (0, 3, 0) normal (0, 1, 0) x (1, 0, 0)
  circle A0 centre (8.6614, -48.4759) radius 9.652
  circle A1 centre (19.8374, -73.2663) radius 1.651 projected
  point P0 (0, 0)
  dimension "d133" = 19.304
  dimension "d134" = 11.176
  dimension "d135" = 24.7904
extrude "Extrusion4" cut sketch "Sketch14" against normal through all contours A0
equation "\"d128\" = d127"
equation "\"d129\" = d125"
properties part number "SwarmieTopPlate"
